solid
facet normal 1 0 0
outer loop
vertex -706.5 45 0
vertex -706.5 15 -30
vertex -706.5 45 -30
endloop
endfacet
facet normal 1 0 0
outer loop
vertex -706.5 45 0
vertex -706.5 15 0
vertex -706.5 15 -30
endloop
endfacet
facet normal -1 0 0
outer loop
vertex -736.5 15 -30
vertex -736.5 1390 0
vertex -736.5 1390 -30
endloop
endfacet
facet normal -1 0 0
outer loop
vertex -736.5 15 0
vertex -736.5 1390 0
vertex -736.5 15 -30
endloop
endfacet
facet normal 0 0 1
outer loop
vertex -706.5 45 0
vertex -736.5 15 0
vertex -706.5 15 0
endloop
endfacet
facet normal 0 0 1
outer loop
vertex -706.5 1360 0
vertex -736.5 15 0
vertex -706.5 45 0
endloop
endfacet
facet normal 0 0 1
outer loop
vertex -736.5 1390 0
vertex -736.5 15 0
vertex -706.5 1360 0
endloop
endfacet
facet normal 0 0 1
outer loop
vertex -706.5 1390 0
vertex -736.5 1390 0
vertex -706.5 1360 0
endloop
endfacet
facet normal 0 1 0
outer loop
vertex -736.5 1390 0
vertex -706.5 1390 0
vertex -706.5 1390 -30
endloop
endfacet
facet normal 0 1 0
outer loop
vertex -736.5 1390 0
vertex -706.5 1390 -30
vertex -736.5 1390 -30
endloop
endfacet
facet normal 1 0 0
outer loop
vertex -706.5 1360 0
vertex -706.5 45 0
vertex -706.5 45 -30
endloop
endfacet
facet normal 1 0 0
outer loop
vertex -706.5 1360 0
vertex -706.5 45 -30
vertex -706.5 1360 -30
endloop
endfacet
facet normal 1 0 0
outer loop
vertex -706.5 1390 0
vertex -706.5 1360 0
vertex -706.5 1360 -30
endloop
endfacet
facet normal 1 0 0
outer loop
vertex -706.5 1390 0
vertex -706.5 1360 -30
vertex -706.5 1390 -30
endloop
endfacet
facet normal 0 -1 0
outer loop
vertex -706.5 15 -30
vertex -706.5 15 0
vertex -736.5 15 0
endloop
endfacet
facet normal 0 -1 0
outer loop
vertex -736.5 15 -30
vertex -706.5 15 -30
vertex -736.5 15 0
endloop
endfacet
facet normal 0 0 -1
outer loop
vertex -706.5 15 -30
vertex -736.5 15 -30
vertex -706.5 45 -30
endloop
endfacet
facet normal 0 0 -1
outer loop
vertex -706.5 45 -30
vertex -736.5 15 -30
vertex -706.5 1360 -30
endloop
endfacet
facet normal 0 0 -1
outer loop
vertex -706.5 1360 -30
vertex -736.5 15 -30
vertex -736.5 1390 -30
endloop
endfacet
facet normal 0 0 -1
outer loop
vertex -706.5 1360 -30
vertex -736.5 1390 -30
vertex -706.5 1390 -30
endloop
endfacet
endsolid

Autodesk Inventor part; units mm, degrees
ref_plane "YZ Plane" through (0, 0, 0) normal (1, 0, 0) x (0, 1, 0)
ref_plane "XZ Plane" through (0, 0, 0) normal (0, 1, 0) x (-1, 0, 0)
ref_plane "XY Plane" through (0, 0, 0) normal (0, 0, 1) x (1, 0, 0)
ref_plane "Plano de trabajo1" through (0, 0, 0) normal (0, 0, 1) x (1, 0, 0)
sketch "Boceto1" plane through (0, 0, 0) normal (0, 0, 1) x (1, 0, 0)
  line L0 (-706.5, 15) -> (-706.5, 1360) projected
  line L1 (-706.5, 1360) -> (-185.5, 1360) projected
  line L2 (-185.5, 1360) -> (-185.5, 15) projected
  line L3 (-185.5, 15) -> (-706.5, 15) projected
  line L4 (692.5, -15) -> (692.5, -536) projected
  line L5 (692.5, -536) -> (-706.5, -536) projected
  line L6 (-706.5, -536) -> (-706.5, -15) projected
  line L7 (-706.5, -15) -> (692.5, -15) projected
  line L8 (722.5, -566) -> (722.5, 15) projected
  line L9 (722.5, 15) -> (-155.5, 15) projected
  line L10 (-155.5, 15) -> (-155.5, 1390) projected
  line L11 (-155.5, 1390) -> (-736.5, 1390) projected
  line L12 (-736.5, 1390) -> (-736.5, -566) projected
  line L13 (-736.5, -566) -> (722.5, -566) projected
  line L14 (-706.5, 15) -> (-706.5, 45)
  line L15 (-706.5, 45) -> (-185.5, 45)
  line L16 (-185.5, 15) -> (-155.5, 15)
  line L17 (-706.5, 15) -> (-736.5, 15)
  line L18 (-706.5, 1360) -> (-706.5, 1390)
  point P0 (0, 0)
  dimension "d0" = 30
extrude "Extrusión1" add sketch "Boceto1" against normal blind 30 contours L17 L12 L11 L18 L0
properties part number "BarraMarco1.2"
